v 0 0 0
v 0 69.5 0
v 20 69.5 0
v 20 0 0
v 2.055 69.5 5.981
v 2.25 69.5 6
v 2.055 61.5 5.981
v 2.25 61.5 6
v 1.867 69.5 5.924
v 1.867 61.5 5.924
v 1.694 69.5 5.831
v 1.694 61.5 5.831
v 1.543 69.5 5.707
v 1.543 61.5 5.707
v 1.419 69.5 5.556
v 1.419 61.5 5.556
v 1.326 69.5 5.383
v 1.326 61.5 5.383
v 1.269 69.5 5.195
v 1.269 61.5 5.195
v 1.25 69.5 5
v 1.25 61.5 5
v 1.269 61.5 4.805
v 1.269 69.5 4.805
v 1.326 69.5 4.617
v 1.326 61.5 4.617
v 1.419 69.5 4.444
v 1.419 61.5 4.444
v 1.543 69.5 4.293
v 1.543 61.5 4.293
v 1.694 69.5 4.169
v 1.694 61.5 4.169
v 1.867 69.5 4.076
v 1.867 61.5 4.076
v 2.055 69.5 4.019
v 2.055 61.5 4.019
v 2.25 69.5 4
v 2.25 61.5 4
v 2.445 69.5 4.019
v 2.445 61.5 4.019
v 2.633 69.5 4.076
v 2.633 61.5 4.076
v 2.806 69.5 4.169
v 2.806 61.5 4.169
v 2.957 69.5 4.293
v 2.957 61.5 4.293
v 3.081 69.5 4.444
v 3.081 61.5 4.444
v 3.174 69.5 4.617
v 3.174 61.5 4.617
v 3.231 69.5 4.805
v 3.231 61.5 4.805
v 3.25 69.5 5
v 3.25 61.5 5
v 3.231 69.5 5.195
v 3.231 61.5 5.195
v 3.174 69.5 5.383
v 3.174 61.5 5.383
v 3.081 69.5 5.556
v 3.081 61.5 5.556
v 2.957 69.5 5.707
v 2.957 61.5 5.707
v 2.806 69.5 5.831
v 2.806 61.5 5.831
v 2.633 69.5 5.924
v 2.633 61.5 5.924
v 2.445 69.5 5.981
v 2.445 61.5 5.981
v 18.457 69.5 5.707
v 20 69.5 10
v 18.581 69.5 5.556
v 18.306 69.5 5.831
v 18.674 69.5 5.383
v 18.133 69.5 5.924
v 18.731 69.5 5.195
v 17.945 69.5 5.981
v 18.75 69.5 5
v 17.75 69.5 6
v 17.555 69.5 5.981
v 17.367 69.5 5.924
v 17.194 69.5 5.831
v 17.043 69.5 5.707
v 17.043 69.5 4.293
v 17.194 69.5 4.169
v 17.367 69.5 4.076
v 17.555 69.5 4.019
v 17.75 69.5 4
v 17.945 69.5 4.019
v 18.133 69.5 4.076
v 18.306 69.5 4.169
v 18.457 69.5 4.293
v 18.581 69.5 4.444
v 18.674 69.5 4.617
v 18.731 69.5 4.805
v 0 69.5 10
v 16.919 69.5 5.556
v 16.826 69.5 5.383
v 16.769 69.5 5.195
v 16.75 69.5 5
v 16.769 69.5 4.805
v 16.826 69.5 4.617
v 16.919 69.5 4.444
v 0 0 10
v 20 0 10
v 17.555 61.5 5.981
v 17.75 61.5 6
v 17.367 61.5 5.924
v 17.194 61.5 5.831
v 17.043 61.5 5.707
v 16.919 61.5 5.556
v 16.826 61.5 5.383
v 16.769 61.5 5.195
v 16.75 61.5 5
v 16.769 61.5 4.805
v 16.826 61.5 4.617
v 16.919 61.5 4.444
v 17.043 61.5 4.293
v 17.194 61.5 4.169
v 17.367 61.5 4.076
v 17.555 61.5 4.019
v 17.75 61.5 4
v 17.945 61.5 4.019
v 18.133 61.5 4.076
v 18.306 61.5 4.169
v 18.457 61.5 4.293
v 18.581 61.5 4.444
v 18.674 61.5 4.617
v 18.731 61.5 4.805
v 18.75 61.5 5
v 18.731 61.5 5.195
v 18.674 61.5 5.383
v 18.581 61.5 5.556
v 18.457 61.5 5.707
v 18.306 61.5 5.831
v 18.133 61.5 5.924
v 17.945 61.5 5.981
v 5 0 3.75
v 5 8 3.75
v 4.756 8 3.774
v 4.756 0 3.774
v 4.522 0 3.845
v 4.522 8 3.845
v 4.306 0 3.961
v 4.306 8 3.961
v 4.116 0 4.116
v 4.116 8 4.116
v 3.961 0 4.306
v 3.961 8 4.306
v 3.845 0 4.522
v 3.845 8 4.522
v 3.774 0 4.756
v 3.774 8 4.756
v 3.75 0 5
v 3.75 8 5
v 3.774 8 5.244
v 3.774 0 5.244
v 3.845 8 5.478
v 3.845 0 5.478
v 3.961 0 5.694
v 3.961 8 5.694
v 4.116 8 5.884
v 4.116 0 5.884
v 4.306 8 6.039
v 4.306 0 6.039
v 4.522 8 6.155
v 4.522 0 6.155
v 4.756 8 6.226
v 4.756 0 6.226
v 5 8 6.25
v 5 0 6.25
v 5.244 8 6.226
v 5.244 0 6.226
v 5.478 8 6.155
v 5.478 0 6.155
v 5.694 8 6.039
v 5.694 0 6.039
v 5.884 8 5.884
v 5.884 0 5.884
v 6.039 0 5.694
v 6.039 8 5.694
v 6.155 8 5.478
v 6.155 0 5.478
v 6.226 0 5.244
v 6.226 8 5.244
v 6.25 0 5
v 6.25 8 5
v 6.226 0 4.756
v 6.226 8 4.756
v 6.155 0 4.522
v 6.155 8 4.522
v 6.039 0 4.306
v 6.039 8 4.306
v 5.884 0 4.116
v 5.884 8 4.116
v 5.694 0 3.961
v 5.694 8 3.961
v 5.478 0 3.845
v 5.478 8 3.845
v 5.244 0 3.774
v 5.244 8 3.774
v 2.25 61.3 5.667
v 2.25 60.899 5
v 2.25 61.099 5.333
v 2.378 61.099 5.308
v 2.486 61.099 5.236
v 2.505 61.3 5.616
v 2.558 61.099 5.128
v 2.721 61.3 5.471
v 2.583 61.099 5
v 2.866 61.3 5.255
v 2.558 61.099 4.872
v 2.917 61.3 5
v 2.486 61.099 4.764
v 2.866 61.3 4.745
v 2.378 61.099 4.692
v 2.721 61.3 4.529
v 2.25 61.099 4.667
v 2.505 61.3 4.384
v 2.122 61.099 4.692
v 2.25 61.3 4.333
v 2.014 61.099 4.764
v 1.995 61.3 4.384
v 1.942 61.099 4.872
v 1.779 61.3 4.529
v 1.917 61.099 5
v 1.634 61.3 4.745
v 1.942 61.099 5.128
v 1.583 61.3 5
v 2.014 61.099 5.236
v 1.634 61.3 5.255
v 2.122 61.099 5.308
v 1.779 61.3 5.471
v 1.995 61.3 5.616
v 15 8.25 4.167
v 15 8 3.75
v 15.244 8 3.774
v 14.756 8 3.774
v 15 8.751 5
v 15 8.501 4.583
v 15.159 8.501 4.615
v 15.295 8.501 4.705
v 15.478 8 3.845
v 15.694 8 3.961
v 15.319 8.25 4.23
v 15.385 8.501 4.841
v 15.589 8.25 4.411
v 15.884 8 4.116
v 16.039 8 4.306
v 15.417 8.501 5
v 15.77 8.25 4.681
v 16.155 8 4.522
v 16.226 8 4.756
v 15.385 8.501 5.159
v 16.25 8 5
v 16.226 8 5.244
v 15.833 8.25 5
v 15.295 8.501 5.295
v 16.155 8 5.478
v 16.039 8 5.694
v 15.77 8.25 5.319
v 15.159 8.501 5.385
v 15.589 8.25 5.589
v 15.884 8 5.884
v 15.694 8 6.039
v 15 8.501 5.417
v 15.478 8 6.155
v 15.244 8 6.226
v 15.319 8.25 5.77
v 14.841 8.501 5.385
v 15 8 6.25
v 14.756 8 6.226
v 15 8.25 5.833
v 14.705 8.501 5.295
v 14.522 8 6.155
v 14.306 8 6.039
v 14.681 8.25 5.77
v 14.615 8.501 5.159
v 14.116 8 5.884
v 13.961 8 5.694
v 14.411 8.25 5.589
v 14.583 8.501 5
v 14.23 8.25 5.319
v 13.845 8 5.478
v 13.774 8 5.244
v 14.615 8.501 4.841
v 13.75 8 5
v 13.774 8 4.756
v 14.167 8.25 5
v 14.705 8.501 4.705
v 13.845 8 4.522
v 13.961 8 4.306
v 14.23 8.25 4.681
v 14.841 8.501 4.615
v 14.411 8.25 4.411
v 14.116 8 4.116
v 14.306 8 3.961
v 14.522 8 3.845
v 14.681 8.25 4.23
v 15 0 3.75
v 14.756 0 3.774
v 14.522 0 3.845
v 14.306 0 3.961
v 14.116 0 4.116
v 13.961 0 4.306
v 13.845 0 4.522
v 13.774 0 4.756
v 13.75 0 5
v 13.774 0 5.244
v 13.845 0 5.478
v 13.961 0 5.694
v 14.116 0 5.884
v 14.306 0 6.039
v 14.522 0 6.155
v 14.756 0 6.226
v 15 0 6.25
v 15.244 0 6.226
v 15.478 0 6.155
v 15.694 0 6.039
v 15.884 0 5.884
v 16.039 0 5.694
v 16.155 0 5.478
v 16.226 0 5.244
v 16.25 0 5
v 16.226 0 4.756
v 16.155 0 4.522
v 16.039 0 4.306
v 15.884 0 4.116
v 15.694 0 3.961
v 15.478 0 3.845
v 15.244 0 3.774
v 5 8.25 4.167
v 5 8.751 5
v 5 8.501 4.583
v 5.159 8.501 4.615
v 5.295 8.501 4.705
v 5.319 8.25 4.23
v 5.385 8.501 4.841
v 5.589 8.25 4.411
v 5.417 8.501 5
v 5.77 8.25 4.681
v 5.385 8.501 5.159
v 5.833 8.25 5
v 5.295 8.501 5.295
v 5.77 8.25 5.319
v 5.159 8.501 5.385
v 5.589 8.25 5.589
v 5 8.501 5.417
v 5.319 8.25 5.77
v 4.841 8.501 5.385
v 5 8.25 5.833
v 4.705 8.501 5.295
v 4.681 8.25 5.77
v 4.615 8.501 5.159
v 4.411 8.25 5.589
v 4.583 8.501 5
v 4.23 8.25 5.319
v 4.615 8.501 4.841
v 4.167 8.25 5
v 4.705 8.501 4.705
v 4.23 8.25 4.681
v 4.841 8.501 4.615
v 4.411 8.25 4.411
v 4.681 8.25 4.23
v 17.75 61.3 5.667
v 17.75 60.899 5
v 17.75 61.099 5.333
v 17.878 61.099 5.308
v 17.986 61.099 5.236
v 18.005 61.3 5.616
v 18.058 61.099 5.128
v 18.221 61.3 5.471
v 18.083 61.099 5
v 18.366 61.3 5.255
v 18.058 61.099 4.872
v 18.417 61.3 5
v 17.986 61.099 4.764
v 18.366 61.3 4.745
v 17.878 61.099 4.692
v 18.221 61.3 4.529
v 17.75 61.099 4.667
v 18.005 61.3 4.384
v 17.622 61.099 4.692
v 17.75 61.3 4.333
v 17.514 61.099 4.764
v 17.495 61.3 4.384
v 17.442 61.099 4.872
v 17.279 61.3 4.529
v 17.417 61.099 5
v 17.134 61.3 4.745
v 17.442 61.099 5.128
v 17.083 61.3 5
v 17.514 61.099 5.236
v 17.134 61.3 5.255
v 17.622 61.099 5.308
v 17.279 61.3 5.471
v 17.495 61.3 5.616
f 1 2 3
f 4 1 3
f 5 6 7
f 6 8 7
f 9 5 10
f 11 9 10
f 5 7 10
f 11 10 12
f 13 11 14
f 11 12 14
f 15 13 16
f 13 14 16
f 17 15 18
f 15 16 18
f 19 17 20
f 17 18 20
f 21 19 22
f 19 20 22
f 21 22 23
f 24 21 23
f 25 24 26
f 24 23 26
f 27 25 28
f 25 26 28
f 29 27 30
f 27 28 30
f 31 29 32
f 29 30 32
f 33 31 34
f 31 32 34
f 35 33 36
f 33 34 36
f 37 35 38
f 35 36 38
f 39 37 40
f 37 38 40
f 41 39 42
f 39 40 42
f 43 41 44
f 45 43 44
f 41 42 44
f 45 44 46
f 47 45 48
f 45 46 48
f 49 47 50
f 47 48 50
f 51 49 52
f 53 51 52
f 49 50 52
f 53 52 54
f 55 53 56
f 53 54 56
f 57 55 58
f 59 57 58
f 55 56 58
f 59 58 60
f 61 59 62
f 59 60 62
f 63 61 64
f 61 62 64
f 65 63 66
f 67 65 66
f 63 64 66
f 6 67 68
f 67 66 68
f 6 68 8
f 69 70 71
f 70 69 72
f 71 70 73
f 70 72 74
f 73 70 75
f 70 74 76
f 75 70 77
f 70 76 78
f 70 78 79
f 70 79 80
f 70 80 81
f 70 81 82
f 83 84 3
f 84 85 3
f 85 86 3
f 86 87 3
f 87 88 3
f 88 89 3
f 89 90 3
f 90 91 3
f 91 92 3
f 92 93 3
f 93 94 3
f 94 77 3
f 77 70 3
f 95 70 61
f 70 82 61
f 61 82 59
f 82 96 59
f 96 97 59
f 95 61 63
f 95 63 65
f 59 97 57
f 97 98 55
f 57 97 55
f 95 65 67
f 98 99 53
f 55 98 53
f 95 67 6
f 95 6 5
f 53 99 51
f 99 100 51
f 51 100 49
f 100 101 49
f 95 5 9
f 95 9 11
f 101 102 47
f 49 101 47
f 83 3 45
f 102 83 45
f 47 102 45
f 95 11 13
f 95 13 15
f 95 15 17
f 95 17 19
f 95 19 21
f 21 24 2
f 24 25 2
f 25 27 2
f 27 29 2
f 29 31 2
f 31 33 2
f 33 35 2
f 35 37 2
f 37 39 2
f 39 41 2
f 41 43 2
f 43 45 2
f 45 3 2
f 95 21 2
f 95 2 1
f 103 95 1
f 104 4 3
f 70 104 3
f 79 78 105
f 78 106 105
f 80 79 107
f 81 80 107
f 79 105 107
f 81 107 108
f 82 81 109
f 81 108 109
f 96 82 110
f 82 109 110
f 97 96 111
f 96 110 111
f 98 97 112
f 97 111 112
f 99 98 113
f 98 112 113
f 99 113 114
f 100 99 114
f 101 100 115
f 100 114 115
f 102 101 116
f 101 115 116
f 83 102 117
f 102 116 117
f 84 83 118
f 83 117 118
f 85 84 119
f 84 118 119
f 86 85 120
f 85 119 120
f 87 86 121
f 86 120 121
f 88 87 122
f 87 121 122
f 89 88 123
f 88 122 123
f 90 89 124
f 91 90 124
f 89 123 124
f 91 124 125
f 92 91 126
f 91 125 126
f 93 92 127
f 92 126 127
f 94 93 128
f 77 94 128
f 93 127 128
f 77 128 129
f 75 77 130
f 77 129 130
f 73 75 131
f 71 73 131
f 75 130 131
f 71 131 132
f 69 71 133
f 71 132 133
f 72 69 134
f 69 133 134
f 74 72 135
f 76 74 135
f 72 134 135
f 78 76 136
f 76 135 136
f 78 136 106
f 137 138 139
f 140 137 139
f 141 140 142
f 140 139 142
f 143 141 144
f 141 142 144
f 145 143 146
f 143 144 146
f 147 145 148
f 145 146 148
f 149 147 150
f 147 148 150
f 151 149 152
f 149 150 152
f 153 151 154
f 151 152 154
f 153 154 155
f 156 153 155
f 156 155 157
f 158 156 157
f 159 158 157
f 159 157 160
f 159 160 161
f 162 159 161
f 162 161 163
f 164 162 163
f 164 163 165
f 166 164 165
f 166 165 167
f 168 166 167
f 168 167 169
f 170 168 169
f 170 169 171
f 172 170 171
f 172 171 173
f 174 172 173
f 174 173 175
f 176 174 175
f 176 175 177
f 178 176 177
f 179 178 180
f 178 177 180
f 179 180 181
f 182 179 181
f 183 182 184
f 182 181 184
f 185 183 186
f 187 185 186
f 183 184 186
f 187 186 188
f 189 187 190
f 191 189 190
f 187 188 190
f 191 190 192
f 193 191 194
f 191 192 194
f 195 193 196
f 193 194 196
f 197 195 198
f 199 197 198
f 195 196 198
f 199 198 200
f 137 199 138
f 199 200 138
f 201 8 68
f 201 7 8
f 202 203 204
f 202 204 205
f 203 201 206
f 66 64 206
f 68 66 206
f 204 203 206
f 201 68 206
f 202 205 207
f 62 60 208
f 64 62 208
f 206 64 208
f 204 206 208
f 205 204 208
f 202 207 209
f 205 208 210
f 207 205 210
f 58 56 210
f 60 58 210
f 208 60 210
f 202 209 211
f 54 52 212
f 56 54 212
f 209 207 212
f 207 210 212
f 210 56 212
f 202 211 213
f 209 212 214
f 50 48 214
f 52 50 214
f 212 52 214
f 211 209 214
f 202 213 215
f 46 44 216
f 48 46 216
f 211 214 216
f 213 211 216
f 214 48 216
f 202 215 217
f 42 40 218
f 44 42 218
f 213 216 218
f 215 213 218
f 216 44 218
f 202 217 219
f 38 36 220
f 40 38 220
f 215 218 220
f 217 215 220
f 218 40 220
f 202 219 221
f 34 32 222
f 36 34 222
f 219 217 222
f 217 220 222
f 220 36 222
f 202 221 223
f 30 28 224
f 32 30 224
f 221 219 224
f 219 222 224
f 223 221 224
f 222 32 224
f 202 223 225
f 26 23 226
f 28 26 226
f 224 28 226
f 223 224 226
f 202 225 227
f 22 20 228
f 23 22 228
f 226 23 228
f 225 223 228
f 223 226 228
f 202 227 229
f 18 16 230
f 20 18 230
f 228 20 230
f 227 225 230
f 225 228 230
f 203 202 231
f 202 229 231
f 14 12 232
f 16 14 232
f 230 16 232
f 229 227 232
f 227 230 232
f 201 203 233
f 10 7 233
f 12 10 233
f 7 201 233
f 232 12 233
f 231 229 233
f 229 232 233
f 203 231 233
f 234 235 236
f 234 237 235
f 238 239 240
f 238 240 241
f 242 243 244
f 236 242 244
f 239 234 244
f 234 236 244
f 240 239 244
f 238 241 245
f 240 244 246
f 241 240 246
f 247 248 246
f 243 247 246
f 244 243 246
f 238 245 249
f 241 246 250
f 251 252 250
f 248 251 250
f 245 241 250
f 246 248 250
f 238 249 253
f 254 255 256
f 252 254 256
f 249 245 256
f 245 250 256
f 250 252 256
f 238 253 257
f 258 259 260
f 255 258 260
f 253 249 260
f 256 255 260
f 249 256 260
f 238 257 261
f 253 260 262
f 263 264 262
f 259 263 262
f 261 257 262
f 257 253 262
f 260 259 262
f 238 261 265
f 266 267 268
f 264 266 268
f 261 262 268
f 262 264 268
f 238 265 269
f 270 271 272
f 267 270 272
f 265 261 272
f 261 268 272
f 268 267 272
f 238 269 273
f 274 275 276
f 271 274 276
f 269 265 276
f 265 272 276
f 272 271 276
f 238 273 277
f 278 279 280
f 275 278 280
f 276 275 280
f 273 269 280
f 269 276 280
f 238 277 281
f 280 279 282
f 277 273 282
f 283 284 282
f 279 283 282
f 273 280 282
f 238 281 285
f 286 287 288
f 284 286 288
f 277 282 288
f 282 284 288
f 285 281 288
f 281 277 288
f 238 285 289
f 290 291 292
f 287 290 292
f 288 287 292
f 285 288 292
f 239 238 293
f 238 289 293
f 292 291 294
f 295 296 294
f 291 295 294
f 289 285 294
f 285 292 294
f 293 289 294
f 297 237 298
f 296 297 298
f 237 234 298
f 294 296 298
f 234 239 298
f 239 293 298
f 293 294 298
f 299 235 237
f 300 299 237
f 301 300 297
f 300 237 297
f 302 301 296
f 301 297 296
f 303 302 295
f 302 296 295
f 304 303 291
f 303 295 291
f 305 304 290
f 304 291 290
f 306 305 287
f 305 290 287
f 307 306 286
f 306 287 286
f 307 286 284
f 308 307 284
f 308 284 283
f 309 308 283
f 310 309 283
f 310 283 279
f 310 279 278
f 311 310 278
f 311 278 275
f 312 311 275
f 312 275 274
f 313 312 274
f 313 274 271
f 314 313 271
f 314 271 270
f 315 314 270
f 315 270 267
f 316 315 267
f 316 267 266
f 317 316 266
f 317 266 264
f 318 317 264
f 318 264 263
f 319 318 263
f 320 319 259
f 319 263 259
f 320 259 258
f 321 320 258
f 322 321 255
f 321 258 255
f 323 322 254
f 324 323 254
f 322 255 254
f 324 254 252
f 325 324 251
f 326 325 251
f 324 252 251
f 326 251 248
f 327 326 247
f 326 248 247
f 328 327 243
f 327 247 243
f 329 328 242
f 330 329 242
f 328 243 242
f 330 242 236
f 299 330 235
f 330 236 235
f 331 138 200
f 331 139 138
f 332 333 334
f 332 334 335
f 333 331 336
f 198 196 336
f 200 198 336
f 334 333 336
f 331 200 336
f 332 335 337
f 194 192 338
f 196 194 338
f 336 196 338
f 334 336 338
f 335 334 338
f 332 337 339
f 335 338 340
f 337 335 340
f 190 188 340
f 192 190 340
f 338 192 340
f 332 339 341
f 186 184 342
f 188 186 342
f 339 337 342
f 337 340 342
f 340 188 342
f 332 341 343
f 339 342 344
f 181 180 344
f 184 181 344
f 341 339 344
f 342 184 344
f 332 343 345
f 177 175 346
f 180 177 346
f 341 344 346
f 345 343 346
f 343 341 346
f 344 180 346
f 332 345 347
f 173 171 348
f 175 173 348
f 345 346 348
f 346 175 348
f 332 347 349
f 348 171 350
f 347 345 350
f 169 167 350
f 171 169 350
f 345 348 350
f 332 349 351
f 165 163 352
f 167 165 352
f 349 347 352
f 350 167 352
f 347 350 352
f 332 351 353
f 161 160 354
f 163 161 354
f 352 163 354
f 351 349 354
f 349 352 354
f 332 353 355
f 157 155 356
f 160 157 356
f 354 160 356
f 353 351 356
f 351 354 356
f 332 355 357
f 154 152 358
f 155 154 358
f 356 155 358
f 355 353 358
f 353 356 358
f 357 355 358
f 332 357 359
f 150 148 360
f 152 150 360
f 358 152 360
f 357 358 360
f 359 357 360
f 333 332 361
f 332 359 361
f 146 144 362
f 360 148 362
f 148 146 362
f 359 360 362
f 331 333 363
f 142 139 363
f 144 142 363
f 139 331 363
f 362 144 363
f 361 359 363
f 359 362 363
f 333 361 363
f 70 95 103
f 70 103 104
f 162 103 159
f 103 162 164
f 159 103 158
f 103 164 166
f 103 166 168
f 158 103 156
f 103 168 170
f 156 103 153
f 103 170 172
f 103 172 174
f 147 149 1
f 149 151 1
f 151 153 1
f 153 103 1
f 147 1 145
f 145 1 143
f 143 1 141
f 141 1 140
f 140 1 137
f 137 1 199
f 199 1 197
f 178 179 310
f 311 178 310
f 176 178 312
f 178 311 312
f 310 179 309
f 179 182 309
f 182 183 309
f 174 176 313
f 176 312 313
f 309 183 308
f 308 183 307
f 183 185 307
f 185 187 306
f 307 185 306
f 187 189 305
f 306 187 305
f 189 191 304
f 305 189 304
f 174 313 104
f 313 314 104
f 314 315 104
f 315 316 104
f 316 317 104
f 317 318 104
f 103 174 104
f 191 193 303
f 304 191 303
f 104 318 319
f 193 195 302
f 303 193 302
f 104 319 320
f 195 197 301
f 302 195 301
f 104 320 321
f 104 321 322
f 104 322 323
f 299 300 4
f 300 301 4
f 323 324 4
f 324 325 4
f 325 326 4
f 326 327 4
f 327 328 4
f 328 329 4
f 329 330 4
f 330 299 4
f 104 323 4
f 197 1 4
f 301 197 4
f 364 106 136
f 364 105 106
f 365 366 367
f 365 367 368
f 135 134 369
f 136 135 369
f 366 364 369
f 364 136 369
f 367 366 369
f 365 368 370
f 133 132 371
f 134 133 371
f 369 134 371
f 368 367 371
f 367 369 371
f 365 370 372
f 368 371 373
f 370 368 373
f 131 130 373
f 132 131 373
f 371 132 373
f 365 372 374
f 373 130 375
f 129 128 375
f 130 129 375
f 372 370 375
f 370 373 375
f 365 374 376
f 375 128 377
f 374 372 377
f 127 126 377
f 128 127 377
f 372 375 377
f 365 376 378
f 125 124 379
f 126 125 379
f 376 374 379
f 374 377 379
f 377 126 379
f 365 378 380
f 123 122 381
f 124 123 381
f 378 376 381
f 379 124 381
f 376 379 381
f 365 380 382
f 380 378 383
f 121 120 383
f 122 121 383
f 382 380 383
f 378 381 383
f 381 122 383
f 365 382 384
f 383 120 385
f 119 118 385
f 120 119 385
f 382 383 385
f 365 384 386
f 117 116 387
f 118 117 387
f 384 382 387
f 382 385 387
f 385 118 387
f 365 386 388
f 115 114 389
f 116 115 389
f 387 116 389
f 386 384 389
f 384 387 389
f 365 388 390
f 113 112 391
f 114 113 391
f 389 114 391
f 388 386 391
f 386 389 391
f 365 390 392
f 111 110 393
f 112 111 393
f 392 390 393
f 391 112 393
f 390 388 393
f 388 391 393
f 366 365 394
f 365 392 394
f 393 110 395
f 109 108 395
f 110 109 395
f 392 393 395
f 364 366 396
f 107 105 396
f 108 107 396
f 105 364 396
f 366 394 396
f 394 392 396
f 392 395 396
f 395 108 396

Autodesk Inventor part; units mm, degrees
ref_plane "YZ Plane" through (0, 0, 0) normal (1, 0, 0) x (0, 1, 0)
ref_plane "XZ Plane" through (0, 0, 0) normal (0, 1, 0) x (-1, 0, 0)
ref_plane "XY Plane" through (0, 0, 0) normal (0, 0, 1) x (1, 0, 0)
sketch "Skizze1" plane through (0, 0, 0) normal (0, 0, 1) x (1, 0, 0)
  line L0 (0, 0) -> (20, 0)
  line L1 (20, 0) -> (20, 69.5)
  line L2 (20, 69.5) -> (0, 69.5)
  line L3 (0, 69.5) -> (0, 0)
  dimension "d0" = 20
  dimension "d1" = 69.5
extrude "Extrusion1" add sketch "Skizze1" along normal blind 10
sketch "Skizze2" plane through (0, 69.5, 0) normal (0, 1, 0) x (1, 0, 0)
  line L0 (20, 0) -> (20, -10) projected
  line L1 (20, -10) -> (20, -5)
  line L2 (20, -5) -> (17.75, -5)
  line L3 (17.75, -5) -> (2.25, -5)
  point P0 (0, 0)
  dimension "d4" = 2.25
  dimension "d5" = 15.5
hole "Bohrung1" at (2.25, 69.5, 5) at (17.75, 69.5, 5) direction (0, -1, 0) diameter 2 depth 8 tip angle 118
sketch "Skizze3" plane through (0, 0, 0) normal (0, -1, 0) x (1, 0, 0)
  line L0 (20, 10) -> (0, 10) projected
  line L1 (0, 10) -> (0, 5)
  line L2 (0, 0) -> (0, 10) projected
  line L3 (0, 5) -> (5, 5)
  line L4 (5, 5) -> (15, 5)
  dimension "d13" = 5
  dimension "d14" = 10
hole "Bohrung2" at (5, 0, 5) at (15, 0, 5) direction (0, 1, 0) diameter 2.5 depth 8 tip angle 118
properties part number "Sensor_Halterung_Drehplatte" material "Holz (Eiche)"
